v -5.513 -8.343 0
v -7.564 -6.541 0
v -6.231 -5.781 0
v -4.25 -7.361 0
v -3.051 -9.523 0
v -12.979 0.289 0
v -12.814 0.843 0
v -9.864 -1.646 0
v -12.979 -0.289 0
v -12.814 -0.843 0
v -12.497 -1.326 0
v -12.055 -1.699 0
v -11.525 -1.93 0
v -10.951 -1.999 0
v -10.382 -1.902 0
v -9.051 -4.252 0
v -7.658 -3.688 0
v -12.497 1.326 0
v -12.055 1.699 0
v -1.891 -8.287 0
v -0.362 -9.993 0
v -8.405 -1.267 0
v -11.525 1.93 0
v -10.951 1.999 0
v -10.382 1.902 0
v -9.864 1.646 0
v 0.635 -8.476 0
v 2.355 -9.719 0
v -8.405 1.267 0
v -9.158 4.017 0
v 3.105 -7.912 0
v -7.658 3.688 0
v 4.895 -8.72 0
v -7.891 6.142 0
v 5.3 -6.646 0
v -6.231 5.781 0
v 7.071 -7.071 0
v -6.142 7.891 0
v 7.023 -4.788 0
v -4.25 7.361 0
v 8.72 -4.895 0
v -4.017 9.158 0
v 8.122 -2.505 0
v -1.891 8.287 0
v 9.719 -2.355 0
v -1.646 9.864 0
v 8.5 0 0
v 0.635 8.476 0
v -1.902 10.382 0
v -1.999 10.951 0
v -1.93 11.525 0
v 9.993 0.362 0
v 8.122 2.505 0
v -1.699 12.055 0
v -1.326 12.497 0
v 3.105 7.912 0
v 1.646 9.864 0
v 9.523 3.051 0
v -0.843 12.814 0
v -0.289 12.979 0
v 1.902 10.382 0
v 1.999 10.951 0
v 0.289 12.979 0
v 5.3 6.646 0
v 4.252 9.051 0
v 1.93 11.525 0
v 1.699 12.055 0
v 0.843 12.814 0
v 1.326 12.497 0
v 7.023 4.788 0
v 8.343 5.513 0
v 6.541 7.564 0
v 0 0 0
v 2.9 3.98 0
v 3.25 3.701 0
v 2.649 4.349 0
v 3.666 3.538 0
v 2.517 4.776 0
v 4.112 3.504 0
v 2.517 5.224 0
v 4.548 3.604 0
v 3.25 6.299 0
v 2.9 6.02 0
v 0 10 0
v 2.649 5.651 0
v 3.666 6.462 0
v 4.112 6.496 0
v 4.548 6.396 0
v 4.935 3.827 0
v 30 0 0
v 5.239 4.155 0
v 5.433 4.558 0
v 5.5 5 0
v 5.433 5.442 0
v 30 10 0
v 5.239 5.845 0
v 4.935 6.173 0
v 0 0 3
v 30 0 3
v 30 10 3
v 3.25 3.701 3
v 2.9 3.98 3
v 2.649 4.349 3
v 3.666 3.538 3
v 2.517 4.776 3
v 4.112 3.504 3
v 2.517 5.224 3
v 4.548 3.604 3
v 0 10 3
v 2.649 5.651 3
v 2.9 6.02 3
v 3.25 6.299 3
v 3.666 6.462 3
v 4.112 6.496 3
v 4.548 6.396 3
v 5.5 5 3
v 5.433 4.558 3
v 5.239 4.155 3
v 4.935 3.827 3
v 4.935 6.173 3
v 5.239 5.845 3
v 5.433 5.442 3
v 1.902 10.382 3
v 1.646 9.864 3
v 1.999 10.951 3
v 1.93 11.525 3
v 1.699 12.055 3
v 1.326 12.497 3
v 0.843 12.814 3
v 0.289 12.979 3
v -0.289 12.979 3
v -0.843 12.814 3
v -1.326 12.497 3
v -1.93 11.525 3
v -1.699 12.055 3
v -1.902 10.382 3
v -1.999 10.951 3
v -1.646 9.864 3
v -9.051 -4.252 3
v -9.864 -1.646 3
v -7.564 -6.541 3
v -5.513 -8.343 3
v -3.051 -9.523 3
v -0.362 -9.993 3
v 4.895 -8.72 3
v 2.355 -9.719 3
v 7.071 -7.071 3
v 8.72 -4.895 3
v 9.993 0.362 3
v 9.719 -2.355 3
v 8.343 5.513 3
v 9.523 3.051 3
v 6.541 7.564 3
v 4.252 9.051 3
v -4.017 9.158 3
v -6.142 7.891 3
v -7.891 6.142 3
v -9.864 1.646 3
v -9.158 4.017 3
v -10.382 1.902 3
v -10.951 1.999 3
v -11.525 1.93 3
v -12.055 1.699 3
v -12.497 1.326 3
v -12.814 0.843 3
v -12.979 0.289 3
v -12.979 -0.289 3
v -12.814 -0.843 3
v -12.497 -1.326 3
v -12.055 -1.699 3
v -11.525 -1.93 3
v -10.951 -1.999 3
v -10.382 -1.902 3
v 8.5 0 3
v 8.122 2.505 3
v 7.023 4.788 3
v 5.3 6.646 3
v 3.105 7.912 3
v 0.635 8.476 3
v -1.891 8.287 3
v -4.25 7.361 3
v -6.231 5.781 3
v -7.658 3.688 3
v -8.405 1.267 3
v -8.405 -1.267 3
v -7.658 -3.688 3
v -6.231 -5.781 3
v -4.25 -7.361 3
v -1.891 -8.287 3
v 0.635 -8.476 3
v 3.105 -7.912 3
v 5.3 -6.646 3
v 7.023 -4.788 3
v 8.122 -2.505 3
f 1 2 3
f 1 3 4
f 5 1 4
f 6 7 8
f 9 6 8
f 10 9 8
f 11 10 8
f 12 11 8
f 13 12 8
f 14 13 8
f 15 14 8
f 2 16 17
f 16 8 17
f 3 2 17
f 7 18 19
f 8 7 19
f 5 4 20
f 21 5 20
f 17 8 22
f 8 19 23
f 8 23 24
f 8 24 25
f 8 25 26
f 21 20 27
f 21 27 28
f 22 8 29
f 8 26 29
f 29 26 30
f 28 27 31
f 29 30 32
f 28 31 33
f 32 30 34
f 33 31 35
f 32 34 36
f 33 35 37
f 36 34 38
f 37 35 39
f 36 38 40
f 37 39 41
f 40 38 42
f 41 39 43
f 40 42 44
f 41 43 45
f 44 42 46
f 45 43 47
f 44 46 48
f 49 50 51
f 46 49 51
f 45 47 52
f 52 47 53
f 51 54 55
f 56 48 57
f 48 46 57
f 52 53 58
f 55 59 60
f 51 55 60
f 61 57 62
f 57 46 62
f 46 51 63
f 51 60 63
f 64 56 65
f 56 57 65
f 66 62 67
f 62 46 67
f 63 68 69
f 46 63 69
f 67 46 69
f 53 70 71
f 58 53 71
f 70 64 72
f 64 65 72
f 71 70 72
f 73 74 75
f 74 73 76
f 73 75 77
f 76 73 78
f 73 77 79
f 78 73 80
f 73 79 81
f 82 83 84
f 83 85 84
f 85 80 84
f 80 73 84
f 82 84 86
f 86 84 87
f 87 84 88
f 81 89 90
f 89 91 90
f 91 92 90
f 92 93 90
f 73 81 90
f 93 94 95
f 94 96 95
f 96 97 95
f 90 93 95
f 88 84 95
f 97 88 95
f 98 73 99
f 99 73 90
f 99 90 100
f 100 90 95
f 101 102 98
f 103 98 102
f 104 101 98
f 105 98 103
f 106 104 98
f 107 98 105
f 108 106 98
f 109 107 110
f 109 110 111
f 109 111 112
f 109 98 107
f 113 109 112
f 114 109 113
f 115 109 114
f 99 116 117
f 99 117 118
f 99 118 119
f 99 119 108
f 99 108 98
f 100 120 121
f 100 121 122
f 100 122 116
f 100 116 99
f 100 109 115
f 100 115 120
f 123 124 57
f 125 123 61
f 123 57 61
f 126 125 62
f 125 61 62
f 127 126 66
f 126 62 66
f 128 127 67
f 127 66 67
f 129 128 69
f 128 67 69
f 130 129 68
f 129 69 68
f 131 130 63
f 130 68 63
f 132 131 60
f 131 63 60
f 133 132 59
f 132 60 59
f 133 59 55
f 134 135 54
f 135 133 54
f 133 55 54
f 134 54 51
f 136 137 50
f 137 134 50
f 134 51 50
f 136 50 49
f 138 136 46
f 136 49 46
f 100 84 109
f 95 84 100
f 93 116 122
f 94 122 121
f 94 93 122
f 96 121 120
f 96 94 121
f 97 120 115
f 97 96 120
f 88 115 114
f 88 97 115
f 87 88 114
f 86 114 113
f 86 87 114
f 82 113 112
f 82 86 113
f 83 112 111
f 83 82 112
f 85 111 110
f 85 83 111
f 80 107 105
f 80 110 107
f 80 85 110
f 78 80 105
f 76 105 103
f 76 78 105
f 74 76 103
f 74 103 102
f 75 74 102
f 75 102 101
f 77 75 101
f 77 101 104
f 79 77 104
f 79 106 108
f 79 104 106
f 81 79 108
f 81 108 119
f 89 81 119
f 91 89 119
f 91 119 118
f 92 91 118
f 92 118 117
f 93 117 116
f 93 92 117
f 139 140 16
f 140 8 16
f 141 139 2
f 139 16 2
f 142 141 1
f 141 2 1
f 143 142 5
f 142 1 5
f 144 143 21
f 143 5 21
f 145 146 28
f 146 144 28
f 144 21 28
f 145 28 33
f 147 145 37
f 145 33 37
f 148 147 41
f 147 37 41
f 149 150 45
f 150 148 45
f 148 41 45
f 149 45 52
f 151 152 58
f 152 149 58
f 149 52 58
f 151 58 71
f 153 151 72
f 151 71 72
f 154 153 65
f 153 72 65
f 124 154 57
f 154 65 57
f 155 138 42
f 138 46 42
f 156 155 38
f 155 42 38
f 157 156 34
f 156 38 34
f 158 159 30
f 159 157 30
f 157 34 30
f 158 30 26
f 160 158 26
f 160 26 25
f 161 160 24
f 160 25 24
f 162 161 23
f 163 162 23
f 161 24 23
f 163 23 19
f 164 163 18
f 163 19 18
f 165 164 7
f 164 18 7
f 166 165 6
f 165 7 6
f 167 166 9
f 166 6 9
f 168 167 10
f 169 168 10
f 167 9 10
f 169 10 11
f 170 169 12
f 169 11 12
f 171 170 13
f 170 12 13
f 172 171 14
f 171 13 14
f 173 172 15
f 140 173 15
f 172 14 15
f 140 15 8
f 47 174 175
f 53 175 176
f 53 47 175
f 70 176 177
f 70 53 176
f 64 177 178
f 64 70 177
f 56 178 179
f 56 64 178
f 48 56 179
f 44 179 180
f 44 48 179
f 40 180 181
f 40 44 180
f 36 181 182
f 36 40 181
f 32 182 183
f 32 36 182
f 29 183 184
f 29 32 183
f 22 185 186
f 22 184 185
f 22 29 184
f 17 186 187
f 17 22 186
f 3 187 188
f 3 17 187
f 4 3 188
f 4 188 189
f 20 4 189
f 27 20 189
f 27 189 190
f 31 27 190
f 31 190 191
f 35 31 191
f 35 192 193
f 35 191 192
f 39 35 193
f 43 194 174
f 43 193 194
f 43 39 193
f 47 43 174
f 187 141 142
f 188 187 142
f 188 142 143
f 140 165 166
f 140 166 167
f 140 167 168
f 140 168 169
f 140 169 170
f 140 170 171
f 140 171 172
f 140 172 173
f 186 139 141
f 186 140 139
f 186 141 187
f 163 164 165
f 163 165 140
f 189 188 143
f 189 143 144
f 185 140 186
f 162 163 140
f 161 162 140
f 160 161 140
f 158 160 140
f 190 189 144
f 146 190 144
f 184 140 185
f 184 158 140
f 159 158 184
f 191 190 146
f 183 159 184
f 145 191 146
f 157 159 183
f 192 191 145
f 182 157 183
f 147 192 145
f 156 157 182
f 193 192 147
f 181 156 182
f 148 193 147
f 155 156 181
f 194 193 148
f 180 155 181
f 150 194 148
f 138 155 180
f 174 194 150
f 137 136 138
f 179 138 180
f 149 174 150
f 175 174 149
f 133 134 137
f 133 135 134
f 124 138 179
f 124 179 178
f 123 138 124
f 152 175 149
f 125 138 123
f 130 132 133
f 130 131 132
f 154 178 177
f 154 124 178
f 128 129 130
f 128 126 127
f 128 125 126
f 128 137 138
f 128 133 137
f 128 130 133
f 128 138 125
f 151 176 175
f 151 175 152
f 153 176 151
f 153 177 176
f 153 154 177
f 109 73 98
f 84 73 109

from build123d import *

# Parameters (mm, degrees)
CYLINDER_R        = 1.5
CYLINDER_DEPTH    = 10
BOX_W             = 30
BOX_H             = 10
BOX_DEPTH         = 3
CYLINDER004_R     = 2
CYLINDER004_DEPTH = 3
CYLINDER003_R     = 2
CYLINDER003_DEPTH = 3
CYLINDER002_R     = 8.5
CYLINDER002_DEPTH = 10
CYLINDER001_R     = 10
CYLINDER001_DEPTH = 3


with BuildPart() as cylinder:
    # Cylinder → Cylinder (new body)
    with BuildSketch(Plane(origin=(4, 5, 0), x_dir=(1, 0, 0), z_dir=(0, 0, 1))):
        Circle(CYLINDER_R)
    extrude(amount=CYLINDER_DEPTH)


with BuildPart() as cut:
    # Box → Box (new body)
    with BuildSketch(Plane.XY):
        with Locations((15, 5)):
            Rectangle(BOX_W, BOX_H)
    extrude(amount=BOX_DEPTH)

    # Cut: cut Cylinder
    add(cylinder.part, mode=Mode.SUBTRACT)


with BuildPart() as cylinder004:
    # Cylinder004 → Cylinder004 (new body)
    with BuildSketch(Plane(origin=(-11, 0, 0), x_dir=(1, 0, 0), z_dir=(0, 0, 1))):
        Circle(CYLINDER004_R)
    extrude(amount=CYLINDER004_DEPTH)


with BuildPart() as cylinder003:
    # Cylinder003 → Cylinder003 (new body)
    with BuildSketch(Plane(origin=(0, 11, 0), x_dir=(1, 0, 0), z_dir=(0, 0, 1))):
        Circle(CYLINDER003_R)
    extrude(amount=CYLINDER003_DEPTH)


with BuildPart() as cylinder002:
    # Cylinder002 → Cylinder002 (new body)
    with BuildSketch(Plane.XY):
        Circle(CYLINDER002_R)
    extrude(amount=CYLINDER002_DEPTH)


with BuildPart() as anillo:
    # Cylinder001 → Cylinder001 (new body)
    with BuildSketch(Plane.XY):
        Circle(CYLINDER001_R)
    extrude(amount=CYLINDER001_DEPTH)

    # Cut001: cut Cylinder002
    add(cylinder002.part, mode=Mode.SUBTRACT)

    # Fusion: union Cylinder004, Cylinder003
    add(cylinder004.part)
    add(cylinder003.part)


solid = Compound([cut.part, anillo.part])
